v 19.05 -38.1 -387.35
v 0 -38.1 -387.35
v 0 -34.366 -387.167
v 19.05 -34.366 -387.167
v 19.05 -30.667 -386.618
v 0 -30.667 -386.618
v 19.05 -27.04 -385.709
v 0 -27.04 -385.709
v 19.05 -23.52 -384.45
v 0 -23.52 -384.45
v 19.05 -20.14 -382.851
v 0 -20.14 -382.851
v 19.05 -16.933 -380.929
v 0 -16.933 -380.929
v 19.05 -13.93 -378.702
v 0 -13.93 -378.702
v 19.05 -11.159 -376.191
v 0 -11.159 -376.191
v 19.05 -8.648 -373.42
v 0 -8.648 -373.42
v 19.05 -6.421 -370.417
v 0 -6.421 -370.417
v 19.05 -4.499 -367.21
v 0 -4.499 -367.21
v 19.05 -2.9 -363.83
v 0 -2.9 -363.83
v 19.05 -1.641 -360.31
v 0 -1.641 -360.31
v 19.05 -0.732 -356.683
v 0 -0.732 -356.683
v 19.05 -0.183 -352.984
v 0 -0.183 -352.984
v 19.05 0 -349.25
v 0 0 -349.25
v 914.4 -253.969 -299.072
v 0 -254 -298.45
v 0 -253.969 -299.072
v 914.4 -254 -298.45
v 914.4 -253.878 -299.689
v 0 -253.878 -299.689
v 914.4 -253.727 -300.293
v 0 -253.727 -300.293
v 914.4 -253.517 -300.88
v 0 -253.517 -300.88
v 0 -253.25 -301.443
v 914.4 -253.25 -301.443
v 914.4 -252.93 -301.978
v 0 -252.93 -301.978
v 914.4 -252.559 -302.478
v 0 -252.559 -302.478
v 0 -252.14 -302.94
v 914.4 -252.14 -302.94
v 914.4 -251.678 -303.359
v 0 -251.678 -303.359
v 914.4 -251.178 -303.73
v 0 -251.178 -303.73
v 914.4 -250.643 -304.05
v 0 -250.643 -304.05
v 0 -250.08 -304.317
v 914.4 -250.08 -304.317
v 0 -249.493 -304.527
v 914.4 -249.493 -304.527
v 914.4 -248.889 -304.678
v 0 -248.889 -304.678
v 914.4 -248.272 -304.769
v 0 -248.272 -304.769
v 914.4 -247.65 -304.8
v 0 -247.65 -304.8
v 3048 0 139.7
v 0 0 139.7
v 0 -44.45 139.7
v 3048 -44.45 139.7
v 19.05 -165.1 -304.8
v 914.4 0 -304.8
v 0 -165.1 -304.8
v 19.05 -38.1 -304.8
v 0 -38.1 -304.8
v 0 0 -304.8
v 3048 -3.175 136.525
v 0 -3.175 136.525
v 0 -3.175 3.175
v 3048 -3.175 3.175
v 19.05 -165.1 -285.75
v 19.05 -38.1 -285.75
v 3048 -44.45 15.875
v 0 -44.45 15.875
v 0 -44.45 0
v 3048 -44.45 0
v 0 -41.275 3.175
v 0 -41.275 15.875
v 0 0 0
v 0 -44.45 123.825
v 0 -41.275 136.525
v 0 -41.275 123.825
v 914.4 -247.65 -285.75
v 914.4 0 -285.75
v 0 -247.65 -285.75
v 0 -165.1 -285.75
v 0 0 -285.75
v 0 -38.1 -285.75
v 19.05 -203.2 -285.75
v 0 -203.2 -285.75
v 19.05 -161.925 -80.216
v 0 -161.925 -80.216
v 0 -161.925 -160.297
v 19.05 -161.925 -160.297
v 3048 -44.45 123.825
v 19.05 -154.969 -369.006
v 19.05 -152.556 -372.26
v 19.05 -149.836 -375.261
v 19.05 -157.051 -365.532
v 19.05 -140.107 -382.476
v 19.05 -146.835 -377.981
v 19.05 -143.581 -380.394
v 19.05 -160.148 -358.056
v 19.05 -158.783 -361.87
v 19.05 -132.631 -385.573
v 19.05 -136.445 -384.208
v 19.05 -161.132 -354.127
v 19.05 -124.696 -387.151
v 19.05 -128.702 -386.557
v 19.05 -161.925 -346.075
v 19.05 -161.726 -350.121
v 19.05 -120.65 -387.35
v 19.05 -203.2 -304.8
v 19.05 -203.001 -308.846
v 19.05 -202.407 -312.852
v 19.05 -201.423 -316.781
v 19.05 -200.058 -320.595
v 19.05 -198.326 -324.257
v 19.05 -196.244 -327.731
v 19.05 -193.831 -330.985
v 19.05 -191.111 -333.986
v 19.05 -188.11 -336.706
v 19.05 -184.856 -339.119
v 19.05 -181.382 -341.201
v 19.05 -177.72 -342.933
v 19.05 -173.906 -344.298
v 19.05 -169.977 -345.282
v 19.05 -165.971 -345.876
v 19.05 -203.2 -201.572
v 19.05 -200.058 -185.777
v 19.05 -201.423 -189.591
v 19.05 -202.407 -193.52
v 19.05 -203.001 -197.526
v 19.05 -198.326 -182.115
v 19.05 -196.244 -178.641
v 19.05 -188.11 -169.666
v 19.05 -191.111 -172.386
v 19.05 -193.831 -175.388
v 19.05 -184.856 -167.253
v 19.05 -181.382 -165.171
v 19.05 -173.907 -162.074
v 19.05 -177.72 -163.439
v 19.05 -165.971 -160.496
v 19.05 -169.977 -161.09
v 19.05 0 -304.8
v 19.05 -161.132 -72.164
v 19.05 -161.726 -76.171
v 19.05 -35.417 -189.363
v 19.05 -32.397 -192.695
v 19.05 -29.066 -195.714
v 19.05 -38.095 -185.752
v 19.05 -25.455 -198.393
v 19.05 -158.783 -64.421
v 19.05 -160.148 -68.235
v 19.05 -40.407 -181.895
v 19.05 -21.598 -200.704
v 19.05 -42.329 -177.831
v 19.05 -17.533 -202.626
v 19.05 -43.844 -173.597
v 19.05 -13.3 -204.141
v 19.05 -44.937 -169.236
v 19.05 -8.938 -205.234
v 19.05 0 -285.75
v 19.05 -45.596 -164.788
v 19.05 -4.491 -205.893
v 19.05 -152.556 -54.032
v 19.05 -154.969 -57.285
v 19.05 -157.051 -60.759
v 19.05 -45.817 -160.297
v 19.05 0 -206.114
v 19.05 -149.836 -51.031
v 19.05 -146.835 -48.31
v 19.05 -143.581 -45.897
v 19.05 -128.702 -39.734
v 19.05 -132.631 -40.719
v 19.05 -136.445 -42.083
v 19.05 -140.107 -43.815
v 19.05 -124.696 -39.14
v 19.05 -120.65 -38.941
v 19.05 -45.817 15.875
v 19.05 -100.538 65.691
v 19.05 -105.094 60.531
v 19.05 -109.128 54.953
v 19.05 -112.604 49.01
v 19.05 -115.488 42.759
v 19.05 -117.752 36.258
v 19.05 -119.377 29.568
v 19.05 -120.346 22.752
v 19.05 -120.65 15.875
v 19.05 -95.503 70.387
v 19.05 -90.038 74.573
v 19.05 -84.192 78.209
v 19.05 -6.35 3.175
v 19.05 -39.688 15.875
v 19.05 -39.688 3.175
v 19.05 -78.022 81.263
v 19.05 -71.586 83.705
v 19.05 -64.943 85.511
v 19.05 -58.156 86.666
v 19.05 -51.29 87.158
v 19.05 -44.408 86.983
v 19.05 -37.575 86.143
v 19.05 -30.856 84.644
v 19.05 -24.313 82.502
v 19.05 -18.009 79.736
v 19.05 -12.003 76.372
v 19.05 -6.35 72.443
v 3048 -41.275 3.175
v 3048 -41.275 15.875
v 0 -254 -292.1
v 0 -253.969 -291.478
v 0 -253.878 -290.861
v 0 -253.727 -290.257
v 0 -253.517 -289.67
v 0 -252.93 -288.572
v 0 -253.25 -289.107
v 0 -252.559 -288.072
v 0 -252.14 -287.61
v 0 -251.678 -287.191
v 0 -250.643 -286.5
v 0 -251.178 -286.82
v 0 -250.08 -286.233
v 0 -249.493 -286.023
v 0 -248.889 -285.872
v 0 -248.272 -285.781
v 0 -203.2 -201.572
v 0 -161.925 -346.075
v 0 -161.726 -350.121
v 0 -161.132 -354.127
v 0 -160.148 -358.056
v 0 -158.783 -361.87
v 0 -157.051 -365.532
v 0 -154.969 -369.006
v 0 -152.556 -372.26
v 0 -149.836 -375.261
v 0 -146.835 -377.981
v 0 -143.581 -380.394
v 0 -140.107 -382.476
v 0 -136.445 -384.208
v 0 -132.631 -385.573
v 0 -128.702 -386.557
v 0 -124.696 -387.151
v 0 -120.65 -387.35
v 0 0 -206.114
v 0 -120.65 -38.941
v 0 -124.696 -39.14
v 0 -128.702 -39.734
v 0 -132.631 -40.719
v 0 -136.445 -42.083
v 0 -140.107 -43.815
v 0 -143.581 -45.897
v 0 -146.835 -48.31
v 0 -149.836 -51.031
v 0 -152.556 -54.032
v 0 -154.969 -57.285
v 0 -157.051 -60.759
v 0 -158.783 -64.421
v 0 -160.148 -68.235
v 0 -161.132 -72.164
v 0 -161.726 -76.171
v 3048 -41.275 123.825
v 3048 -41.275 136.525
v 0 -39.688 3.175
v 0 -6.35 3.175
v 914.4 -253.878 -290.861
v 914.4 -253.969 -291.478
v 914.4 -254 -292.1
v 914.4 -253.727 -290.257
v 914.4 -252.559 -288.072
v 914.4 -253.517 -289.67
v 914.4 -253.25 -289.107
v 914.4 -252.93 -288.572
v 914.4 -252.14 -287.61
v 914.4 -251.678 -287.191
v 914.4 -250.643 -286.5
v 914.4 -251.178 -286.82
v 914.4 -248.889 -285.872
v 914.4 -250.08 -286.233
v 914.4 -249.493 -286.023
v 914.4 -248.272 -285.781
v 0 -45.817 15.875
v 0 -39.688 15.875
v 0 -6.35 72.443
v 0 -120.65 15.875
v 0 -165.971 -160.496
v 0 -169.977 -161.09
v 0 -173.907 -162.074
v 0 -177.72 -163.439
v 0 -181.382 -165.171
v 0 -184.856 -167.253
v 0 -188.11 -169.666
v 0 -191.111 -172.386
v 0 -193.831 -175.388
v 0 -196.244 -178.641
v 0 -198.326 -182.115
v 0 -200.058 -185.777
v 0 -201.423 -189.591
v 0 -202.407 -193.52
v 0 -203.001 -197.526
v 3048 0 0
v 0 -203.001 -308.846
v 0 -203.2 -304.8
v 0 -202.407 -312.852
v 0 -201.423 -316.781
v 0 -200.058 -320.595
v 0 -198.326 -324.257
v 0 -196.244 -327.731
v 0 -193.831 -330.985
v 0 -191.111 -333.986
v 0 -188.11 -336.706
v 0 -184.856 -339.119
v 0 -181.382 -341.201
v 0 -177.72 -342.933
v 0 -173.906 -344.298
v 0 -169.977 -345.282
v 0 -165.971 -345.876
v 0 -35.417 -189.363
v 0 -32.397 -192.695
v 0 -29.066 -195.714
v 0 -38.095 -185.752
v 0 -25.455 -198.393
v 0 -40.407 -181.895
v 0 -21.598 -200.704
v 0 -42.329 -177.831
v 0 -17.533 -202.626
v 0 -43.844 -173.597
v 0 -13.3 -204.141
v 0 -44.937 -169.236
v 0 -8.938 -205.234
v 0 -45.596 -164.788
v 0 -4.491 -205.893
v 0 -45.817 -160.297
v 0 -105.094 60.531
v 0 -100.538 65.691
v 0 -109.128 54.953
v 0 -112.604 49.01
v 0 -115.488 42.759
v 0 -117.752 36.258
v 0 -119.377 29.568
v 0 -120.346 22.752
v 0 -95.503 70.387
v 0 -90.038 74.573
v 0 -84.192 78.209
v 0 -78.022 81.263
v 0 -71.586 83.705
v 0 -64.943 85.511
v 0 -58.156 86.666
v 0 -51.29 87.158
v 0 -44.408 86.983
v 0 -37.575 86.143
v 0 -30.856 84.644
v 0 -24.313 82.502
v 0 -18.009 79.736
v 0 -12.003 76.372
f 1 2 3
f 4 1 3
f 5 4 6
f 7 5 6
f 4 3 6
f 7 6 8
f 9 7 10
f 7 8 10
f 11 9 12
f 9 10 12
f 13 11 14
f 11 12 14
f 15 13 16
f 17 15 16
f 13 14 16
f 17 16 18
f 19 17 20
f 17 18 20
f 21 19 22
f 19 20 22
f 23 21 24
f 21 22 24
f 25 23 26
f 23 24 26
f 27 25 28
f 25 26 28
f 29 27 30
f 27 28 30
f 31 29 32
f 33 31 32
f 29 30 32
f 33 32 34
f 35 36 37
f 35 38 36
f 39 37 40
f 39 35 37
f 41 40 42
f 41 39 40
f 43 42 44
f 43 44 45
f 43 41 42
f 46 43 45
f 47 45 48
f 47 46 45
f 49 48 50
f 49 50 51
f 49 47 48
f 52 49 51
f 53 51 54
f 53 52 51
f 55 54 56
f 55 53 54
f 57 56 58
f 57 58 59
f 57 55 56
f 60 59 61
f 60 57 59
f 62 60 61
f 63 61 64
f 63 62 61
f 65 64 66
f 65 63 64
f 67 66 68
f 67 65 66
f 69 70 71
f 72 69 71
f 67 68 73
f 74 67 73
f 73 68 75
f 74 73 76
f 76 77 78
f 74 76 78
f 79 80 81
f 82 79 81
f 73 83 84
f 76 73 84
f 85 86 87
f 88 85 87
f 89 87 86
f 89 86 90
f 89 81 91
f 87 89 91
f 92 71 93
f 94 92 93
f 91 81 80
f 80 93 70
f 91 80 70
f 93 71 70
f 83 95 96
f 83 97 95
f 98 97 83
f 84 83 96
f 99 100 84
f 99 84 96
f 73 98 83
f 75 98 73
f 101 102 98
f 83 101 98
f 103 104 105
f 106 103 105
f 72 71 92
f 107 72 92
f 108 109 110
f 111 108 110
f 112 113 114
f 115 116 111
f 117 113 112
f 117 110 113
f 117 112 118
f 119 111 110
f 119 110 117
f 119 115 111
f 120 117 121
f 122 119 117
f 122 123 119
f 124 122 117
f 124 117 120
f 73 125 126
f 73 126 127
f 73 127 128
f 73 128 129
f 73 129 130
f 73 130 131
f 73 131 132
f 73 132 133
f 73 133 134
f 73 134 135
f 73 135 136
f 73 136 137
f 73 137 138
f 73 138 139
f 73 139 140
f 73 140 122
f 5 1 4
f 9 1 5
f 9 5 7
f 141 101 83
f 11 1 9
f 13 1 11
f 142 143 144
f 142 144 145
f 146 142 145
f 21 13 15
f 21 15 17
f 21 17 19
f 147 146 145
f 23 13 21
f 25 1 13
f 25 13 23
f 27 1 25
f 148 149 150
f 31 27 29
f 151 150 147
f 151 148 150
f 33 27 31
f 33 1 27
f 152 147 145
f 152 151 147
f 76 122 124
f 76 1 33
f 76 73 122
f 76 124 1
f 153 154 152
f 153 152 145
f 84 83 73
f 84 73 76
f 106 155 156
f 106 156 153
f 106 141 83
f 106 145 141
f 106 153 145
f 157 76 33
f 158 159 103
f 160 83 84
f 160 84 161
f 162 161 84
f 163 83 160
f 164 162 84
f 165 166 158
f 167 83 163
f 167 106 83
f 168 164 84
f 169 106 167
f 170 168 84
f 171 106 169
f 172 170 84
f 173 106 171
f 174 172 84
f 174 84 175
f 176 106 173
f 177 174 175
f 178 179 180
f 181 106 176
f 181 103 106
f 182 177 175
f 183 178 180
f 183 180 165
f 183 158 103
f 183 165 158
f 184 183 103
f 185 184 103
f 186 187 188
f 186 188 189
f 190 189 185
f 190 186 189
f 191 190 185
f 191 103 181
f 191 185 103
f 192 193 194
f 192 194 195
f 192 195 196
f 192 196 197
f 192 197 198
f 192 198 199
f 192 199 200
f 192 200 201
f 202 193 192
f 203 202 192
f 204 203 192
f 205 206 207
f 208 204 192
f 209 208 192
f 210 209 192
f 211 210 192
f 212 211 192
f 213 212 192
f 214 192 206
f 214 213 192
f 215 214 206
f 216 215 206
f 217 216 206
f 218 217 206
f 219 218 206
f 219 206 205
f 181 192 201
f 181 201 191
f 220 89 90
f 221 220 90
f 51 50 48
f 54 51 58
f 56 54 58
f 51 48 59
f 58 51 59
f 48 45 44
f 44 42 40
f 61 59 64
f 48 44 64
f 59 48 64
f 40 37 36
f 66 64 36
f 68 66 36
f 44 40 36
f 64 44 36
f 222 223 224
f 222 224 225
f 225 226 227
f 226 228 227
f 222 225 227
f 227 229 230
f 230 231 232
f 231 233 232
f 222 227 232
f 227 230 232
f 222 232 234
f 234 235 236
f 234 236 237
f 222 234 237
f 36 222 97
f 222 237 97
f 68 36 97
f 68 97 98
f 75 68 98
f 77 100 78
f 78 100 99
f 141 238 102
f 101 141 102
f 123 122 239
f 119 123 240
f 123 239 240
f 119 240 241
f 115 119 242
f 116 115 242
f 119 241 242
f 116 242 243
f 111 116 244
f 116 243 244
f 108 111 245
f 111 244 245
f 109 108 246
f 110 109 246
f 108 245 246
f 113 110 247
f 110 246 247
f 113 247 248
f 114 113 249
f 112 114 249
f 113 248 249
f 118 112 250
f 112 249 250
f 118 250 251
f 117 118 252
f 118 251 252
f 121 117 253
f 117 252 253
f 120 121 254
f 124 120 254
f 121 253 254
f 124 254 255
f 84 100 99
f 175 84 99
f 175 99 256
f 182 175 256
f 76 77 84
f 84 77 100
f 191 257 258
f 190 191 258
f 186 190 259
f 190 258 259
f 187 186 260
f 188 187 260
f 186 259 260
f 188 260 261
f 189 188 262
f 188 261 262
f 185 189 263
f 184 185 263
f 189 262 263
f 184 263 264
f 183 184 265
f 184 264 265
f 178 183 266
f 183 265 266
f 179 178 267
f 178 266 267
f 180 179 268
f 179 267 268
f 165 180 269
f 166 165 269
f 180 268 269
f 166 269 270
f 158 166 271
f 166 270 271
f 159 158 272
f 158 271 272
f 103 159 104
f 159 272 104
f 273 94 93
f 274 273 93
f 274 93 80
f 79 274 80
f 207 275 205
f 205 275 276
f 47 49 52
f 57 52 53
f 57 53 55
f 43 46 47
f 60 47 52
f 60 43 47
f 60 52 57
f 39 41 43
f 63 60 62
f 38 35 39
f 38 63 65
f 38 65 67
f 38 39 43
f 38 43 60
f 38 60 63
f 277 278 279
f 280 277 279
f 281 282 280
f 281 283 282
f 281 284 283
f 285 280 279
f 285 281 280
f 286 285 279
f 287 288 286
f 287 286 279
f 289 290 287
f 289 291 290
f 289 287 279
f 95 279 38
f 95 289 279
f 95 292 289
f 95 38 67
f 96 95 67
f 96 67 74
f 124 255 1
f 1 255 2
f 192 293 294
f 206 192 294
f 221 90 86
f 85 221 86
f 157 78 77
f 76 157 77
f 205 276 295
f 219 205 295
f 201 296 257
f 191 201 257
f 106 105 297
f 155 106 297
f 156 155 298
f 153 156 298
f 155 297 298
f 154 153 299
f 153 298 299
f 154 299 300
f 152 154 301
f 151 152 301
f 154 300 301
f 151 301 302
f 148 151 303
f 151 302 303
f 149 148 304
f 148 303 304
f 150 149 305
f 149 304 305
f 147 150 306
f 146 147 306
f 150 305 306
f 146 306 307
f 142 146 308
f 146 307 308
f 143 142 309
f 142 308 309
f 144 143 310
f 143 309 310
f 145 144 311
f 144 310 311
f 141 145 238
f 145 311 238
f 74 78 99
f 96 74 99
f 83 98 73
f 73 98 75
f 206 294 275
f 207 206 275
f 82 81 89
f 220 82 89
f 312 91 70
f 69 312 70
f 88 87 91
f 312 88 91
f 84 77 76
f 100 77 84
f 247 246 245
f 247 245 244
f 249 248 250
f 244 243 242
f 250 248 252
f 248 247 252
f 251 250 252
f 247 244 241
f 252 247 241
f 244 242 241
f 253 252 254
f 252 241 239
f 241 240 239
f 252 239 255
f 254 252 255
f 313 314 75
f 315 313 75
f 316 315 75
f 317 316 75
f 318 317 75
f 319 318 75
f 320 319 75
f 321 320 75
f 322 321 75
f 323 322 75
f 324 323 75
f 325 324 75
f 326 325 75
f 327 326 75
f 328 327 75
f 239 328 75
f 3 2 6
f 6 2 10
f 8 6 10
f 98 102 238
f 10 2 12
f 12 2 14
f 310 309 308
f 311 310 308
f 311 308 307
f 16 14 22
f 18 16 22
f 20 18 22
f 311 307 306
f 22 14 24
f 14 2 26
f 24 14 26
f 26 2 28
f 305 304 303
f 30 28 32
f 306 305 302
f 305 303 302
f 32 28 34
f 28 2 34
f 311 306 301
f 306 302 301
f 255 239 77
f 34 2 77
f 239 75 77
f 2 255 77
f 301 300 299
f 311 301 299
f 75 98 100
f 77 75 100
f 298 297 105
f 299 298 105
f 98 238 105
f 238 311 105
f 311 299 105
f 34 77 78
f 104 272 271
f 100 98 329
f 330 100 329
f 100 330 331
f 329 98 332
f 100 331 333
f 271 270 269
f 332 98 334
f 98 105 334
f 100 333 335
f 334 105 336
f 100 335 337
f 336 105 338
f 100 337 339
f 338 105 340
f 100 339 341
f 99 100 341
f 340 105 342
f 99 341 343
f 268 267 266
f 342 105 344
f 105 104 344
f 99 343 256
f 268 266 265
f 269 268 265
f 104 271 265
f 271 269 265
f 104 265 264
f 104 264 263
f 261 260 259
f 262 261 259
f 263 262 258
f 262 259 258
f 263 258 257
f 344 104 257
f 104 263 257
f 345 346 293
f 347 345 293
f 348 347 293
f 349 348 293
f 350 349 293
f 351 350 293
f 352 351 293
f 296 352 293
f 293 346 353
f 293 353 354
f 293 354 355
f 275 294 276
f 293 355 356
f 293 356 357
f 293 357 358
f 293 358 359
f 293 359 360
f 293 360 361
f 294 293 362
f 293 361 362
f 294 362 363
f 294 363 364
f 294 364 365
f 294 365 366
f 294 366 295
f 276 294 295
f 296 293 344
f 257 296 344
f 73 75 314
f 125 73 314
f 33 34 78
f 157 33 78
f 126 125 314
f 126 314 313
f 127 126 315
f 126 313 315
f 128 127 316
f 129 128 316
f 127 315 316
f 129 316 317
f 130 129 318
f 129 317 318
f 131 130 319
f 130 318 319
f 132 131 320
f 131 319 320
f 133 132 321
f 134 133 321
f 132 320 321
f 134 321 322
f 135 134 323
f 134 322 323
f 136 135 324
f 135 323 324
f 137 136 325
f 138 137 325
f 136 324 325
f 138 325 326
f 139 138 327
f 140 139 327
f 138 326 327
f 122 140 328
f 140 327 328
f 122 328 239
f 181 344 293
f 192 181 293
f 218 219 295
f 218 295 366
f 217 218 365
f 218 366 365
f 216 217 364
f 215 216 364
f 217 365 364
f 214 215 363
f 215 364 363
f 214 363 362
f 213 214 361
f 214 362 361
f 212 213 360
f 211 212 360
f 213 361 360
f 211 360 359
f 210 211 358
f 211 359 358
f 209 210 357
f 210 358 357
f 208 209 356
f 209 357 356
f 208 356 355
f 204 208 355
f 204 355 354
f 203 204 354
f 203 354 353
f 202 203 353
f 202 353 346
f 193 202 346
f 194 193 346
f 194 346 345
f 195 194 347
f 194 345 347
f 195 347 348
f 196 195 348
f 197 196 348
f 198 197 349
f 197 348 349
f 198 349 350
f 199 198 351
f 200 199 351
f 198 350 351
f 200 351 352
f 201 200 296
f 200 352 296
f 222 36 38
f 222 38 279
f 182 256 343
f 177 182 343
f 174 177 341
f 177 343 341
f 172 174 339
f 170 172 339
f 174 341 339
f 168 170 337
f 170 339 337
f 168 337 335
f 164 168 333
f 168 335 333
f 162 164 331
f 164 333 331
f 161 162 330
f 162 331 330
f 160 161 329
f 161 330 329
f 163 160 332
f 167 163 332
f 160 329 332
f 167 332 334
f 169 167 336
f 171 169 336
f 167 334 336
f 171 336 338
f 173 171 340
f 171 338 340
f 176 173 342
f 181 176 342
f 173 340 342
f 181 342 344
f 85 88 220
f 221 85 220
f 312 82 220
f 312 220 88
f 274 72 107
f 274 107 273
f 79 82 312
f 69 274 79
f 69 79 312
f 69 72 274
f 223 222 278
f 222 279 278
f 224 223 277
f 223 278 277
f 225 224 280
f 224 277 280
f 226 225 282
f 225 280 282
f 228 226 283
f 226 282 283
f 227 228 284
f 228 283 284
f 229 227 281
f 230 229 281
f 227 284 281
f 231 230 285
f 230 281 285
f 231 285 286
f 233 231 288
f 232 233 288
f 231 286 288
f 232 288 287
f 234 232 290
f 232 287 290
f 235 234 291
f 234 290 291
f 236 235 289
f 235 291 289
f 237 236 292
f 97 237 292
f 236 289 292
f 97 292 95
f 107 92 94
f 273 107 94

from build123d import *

# Parameters (mm, degrees)
F1_DEPTH = 3048
F2_W     = 254
F2_H     = 19.05
F3_DEPTH = 914.4
F5_DEPTH = 19.05
F7_R     = 6.35


with BuildPart() as f1:
    # F0 (on Right) → F1 (new body)
    with BuildSketch(Plane.YZ):
        Polygon((-44.45, 139.7), (-44.45, 123.825), (-41.275, 123.825), (-41.275, 136.525), (-3.175, 136.525), (-3.175, 3.175), (-41.275, 3.175), (-41.275, 15.875), (-44.45, 15.875), (-44.45, 0), (0, 0), (0, 139.7), align=None)
    extrude(amount=F1_DEPTH)


with BuildPart() as f3:
    # F2 (on Right) → F3 (new body)
    with BuildSketch(Plane.YZ):
        with Locations((-127, -295.275)):
            Rectangle(F2_W, F2_H)
    extrude(amount=F3_DEPTH)


with BuildPart() as f5:
    # F4 (on Right) → F5 (new body)
    with BuildSketch(Plane.YZ):
        with BuildLine():
            Line((-6.35, 3.175), (-6.35, 72.442943))
            ThreePointArc((-6.35, 72.442943), (-81.14446, 79.810998), (-120.65, 15.875))
            Line((-120.65, 15.875), (-120.65, -38.941394))
            ThreePointArc((-120.65, -38.941394), (-149.835832, -51.030562), (-161.925, -80.216394))
            Line((-161.925, -80.216394), (-161.925, -160.297149))
            ThreePointArc((-161.925, -160.297149), (-191.110832, -172.386316), (-203.2, -201.572149))
            Line((-203.2, -201.572149), (-203.2, -285.75))
            Line((-203.2, -285.75), (-165.1, -285.75))
            Line((-165.1, -285.75), (-165.1, -304.8))
            Line((-165.1, -304.8), (-203.2, -304.8))
            ThreePointArc((-203.2, -304.8), (-191.110832, -333.985832), (-161.925, -346.075))
            ThreePointArc((-161.925, -346.075), (-149.835832, -375.260832), (-120.65, -387.35))
            Line((-120.65, -387.35), (-38.1, -387.35))
            ThreePointArc((-38.1, -387.35), (-11.159232, -376.190768), (0, -349.25))
            Line((0, -349.25), (0, -304.8))
            Line((0, -304.8), (-38.1, -304.8))
            Line((-38.1, -304.8), (-38.1, -285.75))
            Line((-38.1, -285.75), (0, -285.75))
            Line((0, -285.75), (0, -206.114095))
            ThreePointArc((0, -206.114095), (-32.397474, -192.694622), (-45.816947, -160.297149))
            Line((-45.816947, -160.297149), (-45.816947, -75.95744))
            Line((-45.816947, -75.95744), (-45.816947, 15.875))
            Line((-45.816947, 15.875), (-39.6875, 15.875))
            Line((-39.6875, 15.875), (-39.6875, 3.175))
            Line((-39.6875, 3.175), (-6.35, 3.175))
        make_face()
    extrude(amount=F5_DEPTH)


with BuildPart() as f3_1:
    add(f3.part)

    # F6: cut F5
    add(f5.part, mode=Mode.SUBTRACT)

    # F7
    f7_edges = [f3_1.edges().sort_by_distance(p)[0] for p in [
        (457.2, -254, -285.75),
        (457.2, -254, -304.8),
    ]]
    fillet(f7_edges, radius=F7_R)


solid = Compound([f1.part, f5.part, f3_1.part])
